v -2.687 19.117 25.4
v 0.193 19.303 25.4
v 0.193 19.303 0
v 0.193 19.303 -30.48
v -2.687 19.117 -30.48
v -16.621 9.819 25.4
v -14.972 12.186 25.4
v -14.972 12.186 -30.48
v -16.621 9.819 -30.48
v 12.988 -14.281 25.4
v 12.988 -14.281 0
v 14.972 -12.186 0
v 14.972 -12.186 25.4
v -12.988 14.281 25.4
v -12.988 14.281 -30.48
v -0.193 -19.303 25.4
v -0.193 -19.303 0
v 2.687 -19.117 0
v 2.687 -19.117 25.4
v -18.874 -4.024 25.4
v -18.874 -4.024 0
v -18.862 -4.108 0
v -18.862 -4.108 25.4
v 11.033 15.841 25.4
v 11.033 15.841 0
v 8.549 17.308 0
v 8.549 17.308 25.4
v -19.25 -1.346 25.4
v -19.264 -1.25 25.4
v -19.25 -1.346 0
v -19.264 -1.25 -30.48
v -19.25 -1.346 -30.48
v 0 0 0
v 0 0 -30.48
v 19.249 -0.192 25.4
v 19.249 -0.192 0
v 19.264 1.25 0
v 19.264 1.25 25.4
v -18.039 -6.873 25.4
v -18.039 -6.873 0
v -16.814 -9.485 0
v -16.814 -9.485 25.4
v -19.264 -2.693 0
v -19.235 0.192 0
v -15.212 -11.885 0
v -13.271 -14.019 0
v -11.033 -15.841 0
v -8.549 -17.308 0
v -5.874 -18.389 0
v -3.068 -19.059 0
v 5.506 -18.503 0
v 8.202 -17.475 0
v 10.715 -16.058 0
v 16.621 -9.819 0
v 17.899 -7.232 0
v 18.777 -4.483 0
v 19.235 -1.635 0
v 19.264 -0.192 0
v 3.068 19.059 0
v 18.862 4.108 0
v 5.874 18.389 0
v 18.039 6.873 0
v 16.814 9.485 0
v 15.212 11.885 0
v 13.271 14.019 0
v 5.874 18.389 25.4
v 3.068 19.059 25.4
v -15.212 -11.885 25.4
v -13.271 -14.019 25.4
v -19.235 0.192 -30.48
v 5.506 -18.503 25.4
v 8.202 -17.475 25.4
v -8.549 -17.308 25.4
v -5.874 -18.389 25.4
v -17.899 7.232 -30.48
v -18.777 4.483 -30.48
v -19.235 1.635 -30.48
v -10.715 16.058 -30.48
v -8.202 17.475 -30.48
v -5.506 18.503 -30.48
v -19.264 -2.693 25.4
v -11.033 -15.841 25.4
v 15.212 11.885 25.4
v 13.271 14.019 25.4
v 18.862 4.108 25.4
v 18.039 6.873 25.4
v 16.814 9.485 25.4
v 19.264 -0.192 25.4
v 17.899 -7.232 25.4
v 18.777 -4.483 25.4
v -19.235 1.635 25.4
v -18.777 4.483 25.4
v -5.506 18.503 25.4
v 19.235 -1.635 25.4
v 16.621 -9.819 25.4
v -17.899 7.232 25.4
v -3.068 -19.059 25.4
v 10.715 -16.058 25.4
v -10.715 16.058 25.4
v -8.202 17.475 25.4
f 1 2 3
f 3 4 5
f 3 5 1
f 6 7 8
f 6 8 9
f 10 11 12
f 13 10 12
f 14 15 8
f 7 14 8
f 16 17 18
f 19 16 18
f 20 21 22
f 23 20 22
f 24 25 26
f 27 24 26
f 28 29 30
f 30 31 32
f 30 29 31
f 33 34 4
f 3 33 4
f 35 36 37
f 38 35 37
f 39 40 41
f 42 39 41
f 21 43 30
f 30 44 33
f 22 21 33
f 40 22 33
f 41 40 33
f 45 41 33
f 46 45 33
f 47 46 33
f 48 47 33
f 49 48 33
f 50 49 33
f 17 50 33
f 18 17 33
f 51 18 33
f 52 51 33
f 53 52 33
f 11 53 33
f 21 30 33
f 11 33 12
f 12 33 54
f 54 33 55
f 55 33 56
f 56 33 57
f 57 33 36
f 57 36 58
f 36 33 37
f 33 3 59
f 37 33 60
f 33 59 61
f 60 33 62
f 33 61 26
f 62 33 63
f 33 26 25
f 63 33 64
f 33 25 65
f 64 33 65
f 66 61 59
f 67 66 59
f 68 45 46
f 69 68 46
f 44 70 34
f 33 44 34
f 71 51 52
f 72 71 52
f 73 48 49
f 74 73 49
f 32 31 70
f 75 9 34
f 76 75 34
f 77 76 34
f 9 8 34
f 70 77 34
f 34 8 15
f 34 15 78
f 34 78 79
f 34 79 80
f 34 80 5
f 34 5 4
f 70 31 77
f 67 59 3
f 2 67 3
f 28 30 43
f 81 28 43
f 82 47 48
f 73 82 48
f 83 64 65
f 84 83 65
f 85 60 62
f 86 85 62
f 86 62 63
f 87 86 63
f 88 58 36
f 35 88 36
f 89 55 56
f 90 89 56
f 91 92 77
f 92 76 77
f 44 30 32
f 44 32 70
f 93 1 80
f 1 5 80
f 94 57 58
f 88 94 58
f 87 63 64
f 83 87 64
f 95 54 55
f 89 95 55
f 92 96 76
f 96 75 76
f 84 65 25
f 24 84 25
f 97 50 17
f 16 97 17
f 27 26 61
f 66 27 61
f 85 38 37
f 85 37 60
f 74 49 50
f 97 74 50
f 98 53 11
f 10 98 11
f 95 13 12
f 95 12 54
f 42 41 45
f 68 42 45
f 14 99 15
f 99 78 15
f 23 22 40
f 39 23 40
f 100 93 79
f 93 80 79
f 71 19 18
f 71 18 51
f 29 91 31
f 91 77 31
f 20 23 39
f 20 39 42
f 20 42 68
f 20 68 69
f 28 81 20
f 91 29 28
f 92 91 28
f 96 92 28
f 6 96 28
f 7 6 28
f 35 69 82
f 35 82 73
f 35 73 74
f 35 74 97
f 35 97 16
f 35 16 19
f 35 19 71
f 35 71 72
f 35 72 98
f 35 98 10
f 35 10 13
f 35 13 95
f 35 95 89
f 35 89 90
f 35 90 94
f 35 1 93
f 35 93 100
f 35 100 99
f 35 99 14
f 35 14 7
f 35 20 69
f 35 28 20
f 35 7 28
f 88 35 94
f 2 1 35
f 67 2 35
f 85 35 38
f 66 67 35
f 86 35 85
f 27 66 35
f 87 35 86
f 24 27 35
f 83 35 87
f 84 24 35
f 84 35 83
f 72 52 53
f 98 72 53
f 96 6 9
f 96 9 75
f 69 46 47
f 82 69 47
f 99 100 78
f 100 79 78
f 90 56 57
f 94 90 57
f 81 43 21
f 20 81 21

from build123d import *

# Parameters (mm, degrees)
F1_DEPTH = 30.48
F2_DEPTH = 25.4


with BuildPart() as f1:
    # F0 (on Top) → F1 (new body)
    with BuildSketch(Plane.XY):
        Polygon((-16.620932, 9.818526), (-17.898666, 7.23164), (-18.776572, 4.483211), (-19.235041, 1.634634), (-19.263831, -1.250458), (-19.250389, -1.346106), (-19.235041, 0.191944), (0, 0), (0.192627, 19.303413), (-2.686549, 19.116519), (-5.505712, 18.502594), (-8.201886, 17.475351), (-10.714844, 16.057738), (-12.98845, 14.281422), (-14.971915, 12.186083), align=None)
    extrude(amount=-F1_DEPTH)

    # F0 (on Top) → F2 (join)
    with BuildSketch(Plane.XY):
        Polygon((-16.620932, 9.818526), (-17.898666, 7.23164), (-18.776572, 4.483211), (-19.235041, 1.634634), (-19.263831, -1.250458), (-19.250389, -1.346106), (-19.235041, 0.191944), (0, 0), (0.192627, 19.303413), (-2.686549, 19.116519), (-5.505712, 18.502594), (-8.201886, 17.475351), (-10.714844, 16.057738), (-12.98845, 14.281422), (-14.971915, 12.186083), align=None)
        Polygon((-19.235041, 0.191944), (-19.250389, -1.346106), (-18.874113, -4.023554), (-18.039414, -6.873017), (-16.813559, -9.484887), (-15.212117, -11.884879), (-13.27086, -14.019383), (-11.033155, -15.840717), (-8.548988, -17.308196), (-5.87385, -18.389038), (-3.0675, -19.0591), (-0.192627, -19.303413), (0, 0), align=None)
        Polygon((-18.874113, -4.023554), (-19.250389, -1.346106), (-19.263831, -2.693147), align=None)
        Polygon((-18.039414, -6.873017), (-18.874113, -4.023554), (-18.862299, -4.107616), align=None)
        Polygon((0.192627, 19.303413), (0, 0), (19.249436, -0.192088), (19.263831, 1.250458), (18.862299, 4.107616), (18.039414, 6.873017), (16.813559, 9.484887), (15.212117, 11.884879), (13.27086, 14.019383), (11.033155, 15.840717), (8.548988, 17.308196), (5.87385, 18.389038), (3.0675, 19.0591), align=None)
        Polygon((19.249436, -0.192088), (0, 0), (-0.192627, -19.303413), (2.686549, -19.116519), (5.505712, -18.502594), (8.201886, -17.475351), (10.714844, -16.057738), (12.98845, -14.281422), (14.971915, -12.186083), (16.620932, -9.818526), (17.898666, -7.23164), (18.776572, -4.483211), (19.235041, -1.634634), align=None)
        Polygon((19.263831, -0.192232), (19.249436, -0.192088), (19.235041, -1.634634), align=None)
    extrude(amount=F2_DEPTH)


solid = f1.part
